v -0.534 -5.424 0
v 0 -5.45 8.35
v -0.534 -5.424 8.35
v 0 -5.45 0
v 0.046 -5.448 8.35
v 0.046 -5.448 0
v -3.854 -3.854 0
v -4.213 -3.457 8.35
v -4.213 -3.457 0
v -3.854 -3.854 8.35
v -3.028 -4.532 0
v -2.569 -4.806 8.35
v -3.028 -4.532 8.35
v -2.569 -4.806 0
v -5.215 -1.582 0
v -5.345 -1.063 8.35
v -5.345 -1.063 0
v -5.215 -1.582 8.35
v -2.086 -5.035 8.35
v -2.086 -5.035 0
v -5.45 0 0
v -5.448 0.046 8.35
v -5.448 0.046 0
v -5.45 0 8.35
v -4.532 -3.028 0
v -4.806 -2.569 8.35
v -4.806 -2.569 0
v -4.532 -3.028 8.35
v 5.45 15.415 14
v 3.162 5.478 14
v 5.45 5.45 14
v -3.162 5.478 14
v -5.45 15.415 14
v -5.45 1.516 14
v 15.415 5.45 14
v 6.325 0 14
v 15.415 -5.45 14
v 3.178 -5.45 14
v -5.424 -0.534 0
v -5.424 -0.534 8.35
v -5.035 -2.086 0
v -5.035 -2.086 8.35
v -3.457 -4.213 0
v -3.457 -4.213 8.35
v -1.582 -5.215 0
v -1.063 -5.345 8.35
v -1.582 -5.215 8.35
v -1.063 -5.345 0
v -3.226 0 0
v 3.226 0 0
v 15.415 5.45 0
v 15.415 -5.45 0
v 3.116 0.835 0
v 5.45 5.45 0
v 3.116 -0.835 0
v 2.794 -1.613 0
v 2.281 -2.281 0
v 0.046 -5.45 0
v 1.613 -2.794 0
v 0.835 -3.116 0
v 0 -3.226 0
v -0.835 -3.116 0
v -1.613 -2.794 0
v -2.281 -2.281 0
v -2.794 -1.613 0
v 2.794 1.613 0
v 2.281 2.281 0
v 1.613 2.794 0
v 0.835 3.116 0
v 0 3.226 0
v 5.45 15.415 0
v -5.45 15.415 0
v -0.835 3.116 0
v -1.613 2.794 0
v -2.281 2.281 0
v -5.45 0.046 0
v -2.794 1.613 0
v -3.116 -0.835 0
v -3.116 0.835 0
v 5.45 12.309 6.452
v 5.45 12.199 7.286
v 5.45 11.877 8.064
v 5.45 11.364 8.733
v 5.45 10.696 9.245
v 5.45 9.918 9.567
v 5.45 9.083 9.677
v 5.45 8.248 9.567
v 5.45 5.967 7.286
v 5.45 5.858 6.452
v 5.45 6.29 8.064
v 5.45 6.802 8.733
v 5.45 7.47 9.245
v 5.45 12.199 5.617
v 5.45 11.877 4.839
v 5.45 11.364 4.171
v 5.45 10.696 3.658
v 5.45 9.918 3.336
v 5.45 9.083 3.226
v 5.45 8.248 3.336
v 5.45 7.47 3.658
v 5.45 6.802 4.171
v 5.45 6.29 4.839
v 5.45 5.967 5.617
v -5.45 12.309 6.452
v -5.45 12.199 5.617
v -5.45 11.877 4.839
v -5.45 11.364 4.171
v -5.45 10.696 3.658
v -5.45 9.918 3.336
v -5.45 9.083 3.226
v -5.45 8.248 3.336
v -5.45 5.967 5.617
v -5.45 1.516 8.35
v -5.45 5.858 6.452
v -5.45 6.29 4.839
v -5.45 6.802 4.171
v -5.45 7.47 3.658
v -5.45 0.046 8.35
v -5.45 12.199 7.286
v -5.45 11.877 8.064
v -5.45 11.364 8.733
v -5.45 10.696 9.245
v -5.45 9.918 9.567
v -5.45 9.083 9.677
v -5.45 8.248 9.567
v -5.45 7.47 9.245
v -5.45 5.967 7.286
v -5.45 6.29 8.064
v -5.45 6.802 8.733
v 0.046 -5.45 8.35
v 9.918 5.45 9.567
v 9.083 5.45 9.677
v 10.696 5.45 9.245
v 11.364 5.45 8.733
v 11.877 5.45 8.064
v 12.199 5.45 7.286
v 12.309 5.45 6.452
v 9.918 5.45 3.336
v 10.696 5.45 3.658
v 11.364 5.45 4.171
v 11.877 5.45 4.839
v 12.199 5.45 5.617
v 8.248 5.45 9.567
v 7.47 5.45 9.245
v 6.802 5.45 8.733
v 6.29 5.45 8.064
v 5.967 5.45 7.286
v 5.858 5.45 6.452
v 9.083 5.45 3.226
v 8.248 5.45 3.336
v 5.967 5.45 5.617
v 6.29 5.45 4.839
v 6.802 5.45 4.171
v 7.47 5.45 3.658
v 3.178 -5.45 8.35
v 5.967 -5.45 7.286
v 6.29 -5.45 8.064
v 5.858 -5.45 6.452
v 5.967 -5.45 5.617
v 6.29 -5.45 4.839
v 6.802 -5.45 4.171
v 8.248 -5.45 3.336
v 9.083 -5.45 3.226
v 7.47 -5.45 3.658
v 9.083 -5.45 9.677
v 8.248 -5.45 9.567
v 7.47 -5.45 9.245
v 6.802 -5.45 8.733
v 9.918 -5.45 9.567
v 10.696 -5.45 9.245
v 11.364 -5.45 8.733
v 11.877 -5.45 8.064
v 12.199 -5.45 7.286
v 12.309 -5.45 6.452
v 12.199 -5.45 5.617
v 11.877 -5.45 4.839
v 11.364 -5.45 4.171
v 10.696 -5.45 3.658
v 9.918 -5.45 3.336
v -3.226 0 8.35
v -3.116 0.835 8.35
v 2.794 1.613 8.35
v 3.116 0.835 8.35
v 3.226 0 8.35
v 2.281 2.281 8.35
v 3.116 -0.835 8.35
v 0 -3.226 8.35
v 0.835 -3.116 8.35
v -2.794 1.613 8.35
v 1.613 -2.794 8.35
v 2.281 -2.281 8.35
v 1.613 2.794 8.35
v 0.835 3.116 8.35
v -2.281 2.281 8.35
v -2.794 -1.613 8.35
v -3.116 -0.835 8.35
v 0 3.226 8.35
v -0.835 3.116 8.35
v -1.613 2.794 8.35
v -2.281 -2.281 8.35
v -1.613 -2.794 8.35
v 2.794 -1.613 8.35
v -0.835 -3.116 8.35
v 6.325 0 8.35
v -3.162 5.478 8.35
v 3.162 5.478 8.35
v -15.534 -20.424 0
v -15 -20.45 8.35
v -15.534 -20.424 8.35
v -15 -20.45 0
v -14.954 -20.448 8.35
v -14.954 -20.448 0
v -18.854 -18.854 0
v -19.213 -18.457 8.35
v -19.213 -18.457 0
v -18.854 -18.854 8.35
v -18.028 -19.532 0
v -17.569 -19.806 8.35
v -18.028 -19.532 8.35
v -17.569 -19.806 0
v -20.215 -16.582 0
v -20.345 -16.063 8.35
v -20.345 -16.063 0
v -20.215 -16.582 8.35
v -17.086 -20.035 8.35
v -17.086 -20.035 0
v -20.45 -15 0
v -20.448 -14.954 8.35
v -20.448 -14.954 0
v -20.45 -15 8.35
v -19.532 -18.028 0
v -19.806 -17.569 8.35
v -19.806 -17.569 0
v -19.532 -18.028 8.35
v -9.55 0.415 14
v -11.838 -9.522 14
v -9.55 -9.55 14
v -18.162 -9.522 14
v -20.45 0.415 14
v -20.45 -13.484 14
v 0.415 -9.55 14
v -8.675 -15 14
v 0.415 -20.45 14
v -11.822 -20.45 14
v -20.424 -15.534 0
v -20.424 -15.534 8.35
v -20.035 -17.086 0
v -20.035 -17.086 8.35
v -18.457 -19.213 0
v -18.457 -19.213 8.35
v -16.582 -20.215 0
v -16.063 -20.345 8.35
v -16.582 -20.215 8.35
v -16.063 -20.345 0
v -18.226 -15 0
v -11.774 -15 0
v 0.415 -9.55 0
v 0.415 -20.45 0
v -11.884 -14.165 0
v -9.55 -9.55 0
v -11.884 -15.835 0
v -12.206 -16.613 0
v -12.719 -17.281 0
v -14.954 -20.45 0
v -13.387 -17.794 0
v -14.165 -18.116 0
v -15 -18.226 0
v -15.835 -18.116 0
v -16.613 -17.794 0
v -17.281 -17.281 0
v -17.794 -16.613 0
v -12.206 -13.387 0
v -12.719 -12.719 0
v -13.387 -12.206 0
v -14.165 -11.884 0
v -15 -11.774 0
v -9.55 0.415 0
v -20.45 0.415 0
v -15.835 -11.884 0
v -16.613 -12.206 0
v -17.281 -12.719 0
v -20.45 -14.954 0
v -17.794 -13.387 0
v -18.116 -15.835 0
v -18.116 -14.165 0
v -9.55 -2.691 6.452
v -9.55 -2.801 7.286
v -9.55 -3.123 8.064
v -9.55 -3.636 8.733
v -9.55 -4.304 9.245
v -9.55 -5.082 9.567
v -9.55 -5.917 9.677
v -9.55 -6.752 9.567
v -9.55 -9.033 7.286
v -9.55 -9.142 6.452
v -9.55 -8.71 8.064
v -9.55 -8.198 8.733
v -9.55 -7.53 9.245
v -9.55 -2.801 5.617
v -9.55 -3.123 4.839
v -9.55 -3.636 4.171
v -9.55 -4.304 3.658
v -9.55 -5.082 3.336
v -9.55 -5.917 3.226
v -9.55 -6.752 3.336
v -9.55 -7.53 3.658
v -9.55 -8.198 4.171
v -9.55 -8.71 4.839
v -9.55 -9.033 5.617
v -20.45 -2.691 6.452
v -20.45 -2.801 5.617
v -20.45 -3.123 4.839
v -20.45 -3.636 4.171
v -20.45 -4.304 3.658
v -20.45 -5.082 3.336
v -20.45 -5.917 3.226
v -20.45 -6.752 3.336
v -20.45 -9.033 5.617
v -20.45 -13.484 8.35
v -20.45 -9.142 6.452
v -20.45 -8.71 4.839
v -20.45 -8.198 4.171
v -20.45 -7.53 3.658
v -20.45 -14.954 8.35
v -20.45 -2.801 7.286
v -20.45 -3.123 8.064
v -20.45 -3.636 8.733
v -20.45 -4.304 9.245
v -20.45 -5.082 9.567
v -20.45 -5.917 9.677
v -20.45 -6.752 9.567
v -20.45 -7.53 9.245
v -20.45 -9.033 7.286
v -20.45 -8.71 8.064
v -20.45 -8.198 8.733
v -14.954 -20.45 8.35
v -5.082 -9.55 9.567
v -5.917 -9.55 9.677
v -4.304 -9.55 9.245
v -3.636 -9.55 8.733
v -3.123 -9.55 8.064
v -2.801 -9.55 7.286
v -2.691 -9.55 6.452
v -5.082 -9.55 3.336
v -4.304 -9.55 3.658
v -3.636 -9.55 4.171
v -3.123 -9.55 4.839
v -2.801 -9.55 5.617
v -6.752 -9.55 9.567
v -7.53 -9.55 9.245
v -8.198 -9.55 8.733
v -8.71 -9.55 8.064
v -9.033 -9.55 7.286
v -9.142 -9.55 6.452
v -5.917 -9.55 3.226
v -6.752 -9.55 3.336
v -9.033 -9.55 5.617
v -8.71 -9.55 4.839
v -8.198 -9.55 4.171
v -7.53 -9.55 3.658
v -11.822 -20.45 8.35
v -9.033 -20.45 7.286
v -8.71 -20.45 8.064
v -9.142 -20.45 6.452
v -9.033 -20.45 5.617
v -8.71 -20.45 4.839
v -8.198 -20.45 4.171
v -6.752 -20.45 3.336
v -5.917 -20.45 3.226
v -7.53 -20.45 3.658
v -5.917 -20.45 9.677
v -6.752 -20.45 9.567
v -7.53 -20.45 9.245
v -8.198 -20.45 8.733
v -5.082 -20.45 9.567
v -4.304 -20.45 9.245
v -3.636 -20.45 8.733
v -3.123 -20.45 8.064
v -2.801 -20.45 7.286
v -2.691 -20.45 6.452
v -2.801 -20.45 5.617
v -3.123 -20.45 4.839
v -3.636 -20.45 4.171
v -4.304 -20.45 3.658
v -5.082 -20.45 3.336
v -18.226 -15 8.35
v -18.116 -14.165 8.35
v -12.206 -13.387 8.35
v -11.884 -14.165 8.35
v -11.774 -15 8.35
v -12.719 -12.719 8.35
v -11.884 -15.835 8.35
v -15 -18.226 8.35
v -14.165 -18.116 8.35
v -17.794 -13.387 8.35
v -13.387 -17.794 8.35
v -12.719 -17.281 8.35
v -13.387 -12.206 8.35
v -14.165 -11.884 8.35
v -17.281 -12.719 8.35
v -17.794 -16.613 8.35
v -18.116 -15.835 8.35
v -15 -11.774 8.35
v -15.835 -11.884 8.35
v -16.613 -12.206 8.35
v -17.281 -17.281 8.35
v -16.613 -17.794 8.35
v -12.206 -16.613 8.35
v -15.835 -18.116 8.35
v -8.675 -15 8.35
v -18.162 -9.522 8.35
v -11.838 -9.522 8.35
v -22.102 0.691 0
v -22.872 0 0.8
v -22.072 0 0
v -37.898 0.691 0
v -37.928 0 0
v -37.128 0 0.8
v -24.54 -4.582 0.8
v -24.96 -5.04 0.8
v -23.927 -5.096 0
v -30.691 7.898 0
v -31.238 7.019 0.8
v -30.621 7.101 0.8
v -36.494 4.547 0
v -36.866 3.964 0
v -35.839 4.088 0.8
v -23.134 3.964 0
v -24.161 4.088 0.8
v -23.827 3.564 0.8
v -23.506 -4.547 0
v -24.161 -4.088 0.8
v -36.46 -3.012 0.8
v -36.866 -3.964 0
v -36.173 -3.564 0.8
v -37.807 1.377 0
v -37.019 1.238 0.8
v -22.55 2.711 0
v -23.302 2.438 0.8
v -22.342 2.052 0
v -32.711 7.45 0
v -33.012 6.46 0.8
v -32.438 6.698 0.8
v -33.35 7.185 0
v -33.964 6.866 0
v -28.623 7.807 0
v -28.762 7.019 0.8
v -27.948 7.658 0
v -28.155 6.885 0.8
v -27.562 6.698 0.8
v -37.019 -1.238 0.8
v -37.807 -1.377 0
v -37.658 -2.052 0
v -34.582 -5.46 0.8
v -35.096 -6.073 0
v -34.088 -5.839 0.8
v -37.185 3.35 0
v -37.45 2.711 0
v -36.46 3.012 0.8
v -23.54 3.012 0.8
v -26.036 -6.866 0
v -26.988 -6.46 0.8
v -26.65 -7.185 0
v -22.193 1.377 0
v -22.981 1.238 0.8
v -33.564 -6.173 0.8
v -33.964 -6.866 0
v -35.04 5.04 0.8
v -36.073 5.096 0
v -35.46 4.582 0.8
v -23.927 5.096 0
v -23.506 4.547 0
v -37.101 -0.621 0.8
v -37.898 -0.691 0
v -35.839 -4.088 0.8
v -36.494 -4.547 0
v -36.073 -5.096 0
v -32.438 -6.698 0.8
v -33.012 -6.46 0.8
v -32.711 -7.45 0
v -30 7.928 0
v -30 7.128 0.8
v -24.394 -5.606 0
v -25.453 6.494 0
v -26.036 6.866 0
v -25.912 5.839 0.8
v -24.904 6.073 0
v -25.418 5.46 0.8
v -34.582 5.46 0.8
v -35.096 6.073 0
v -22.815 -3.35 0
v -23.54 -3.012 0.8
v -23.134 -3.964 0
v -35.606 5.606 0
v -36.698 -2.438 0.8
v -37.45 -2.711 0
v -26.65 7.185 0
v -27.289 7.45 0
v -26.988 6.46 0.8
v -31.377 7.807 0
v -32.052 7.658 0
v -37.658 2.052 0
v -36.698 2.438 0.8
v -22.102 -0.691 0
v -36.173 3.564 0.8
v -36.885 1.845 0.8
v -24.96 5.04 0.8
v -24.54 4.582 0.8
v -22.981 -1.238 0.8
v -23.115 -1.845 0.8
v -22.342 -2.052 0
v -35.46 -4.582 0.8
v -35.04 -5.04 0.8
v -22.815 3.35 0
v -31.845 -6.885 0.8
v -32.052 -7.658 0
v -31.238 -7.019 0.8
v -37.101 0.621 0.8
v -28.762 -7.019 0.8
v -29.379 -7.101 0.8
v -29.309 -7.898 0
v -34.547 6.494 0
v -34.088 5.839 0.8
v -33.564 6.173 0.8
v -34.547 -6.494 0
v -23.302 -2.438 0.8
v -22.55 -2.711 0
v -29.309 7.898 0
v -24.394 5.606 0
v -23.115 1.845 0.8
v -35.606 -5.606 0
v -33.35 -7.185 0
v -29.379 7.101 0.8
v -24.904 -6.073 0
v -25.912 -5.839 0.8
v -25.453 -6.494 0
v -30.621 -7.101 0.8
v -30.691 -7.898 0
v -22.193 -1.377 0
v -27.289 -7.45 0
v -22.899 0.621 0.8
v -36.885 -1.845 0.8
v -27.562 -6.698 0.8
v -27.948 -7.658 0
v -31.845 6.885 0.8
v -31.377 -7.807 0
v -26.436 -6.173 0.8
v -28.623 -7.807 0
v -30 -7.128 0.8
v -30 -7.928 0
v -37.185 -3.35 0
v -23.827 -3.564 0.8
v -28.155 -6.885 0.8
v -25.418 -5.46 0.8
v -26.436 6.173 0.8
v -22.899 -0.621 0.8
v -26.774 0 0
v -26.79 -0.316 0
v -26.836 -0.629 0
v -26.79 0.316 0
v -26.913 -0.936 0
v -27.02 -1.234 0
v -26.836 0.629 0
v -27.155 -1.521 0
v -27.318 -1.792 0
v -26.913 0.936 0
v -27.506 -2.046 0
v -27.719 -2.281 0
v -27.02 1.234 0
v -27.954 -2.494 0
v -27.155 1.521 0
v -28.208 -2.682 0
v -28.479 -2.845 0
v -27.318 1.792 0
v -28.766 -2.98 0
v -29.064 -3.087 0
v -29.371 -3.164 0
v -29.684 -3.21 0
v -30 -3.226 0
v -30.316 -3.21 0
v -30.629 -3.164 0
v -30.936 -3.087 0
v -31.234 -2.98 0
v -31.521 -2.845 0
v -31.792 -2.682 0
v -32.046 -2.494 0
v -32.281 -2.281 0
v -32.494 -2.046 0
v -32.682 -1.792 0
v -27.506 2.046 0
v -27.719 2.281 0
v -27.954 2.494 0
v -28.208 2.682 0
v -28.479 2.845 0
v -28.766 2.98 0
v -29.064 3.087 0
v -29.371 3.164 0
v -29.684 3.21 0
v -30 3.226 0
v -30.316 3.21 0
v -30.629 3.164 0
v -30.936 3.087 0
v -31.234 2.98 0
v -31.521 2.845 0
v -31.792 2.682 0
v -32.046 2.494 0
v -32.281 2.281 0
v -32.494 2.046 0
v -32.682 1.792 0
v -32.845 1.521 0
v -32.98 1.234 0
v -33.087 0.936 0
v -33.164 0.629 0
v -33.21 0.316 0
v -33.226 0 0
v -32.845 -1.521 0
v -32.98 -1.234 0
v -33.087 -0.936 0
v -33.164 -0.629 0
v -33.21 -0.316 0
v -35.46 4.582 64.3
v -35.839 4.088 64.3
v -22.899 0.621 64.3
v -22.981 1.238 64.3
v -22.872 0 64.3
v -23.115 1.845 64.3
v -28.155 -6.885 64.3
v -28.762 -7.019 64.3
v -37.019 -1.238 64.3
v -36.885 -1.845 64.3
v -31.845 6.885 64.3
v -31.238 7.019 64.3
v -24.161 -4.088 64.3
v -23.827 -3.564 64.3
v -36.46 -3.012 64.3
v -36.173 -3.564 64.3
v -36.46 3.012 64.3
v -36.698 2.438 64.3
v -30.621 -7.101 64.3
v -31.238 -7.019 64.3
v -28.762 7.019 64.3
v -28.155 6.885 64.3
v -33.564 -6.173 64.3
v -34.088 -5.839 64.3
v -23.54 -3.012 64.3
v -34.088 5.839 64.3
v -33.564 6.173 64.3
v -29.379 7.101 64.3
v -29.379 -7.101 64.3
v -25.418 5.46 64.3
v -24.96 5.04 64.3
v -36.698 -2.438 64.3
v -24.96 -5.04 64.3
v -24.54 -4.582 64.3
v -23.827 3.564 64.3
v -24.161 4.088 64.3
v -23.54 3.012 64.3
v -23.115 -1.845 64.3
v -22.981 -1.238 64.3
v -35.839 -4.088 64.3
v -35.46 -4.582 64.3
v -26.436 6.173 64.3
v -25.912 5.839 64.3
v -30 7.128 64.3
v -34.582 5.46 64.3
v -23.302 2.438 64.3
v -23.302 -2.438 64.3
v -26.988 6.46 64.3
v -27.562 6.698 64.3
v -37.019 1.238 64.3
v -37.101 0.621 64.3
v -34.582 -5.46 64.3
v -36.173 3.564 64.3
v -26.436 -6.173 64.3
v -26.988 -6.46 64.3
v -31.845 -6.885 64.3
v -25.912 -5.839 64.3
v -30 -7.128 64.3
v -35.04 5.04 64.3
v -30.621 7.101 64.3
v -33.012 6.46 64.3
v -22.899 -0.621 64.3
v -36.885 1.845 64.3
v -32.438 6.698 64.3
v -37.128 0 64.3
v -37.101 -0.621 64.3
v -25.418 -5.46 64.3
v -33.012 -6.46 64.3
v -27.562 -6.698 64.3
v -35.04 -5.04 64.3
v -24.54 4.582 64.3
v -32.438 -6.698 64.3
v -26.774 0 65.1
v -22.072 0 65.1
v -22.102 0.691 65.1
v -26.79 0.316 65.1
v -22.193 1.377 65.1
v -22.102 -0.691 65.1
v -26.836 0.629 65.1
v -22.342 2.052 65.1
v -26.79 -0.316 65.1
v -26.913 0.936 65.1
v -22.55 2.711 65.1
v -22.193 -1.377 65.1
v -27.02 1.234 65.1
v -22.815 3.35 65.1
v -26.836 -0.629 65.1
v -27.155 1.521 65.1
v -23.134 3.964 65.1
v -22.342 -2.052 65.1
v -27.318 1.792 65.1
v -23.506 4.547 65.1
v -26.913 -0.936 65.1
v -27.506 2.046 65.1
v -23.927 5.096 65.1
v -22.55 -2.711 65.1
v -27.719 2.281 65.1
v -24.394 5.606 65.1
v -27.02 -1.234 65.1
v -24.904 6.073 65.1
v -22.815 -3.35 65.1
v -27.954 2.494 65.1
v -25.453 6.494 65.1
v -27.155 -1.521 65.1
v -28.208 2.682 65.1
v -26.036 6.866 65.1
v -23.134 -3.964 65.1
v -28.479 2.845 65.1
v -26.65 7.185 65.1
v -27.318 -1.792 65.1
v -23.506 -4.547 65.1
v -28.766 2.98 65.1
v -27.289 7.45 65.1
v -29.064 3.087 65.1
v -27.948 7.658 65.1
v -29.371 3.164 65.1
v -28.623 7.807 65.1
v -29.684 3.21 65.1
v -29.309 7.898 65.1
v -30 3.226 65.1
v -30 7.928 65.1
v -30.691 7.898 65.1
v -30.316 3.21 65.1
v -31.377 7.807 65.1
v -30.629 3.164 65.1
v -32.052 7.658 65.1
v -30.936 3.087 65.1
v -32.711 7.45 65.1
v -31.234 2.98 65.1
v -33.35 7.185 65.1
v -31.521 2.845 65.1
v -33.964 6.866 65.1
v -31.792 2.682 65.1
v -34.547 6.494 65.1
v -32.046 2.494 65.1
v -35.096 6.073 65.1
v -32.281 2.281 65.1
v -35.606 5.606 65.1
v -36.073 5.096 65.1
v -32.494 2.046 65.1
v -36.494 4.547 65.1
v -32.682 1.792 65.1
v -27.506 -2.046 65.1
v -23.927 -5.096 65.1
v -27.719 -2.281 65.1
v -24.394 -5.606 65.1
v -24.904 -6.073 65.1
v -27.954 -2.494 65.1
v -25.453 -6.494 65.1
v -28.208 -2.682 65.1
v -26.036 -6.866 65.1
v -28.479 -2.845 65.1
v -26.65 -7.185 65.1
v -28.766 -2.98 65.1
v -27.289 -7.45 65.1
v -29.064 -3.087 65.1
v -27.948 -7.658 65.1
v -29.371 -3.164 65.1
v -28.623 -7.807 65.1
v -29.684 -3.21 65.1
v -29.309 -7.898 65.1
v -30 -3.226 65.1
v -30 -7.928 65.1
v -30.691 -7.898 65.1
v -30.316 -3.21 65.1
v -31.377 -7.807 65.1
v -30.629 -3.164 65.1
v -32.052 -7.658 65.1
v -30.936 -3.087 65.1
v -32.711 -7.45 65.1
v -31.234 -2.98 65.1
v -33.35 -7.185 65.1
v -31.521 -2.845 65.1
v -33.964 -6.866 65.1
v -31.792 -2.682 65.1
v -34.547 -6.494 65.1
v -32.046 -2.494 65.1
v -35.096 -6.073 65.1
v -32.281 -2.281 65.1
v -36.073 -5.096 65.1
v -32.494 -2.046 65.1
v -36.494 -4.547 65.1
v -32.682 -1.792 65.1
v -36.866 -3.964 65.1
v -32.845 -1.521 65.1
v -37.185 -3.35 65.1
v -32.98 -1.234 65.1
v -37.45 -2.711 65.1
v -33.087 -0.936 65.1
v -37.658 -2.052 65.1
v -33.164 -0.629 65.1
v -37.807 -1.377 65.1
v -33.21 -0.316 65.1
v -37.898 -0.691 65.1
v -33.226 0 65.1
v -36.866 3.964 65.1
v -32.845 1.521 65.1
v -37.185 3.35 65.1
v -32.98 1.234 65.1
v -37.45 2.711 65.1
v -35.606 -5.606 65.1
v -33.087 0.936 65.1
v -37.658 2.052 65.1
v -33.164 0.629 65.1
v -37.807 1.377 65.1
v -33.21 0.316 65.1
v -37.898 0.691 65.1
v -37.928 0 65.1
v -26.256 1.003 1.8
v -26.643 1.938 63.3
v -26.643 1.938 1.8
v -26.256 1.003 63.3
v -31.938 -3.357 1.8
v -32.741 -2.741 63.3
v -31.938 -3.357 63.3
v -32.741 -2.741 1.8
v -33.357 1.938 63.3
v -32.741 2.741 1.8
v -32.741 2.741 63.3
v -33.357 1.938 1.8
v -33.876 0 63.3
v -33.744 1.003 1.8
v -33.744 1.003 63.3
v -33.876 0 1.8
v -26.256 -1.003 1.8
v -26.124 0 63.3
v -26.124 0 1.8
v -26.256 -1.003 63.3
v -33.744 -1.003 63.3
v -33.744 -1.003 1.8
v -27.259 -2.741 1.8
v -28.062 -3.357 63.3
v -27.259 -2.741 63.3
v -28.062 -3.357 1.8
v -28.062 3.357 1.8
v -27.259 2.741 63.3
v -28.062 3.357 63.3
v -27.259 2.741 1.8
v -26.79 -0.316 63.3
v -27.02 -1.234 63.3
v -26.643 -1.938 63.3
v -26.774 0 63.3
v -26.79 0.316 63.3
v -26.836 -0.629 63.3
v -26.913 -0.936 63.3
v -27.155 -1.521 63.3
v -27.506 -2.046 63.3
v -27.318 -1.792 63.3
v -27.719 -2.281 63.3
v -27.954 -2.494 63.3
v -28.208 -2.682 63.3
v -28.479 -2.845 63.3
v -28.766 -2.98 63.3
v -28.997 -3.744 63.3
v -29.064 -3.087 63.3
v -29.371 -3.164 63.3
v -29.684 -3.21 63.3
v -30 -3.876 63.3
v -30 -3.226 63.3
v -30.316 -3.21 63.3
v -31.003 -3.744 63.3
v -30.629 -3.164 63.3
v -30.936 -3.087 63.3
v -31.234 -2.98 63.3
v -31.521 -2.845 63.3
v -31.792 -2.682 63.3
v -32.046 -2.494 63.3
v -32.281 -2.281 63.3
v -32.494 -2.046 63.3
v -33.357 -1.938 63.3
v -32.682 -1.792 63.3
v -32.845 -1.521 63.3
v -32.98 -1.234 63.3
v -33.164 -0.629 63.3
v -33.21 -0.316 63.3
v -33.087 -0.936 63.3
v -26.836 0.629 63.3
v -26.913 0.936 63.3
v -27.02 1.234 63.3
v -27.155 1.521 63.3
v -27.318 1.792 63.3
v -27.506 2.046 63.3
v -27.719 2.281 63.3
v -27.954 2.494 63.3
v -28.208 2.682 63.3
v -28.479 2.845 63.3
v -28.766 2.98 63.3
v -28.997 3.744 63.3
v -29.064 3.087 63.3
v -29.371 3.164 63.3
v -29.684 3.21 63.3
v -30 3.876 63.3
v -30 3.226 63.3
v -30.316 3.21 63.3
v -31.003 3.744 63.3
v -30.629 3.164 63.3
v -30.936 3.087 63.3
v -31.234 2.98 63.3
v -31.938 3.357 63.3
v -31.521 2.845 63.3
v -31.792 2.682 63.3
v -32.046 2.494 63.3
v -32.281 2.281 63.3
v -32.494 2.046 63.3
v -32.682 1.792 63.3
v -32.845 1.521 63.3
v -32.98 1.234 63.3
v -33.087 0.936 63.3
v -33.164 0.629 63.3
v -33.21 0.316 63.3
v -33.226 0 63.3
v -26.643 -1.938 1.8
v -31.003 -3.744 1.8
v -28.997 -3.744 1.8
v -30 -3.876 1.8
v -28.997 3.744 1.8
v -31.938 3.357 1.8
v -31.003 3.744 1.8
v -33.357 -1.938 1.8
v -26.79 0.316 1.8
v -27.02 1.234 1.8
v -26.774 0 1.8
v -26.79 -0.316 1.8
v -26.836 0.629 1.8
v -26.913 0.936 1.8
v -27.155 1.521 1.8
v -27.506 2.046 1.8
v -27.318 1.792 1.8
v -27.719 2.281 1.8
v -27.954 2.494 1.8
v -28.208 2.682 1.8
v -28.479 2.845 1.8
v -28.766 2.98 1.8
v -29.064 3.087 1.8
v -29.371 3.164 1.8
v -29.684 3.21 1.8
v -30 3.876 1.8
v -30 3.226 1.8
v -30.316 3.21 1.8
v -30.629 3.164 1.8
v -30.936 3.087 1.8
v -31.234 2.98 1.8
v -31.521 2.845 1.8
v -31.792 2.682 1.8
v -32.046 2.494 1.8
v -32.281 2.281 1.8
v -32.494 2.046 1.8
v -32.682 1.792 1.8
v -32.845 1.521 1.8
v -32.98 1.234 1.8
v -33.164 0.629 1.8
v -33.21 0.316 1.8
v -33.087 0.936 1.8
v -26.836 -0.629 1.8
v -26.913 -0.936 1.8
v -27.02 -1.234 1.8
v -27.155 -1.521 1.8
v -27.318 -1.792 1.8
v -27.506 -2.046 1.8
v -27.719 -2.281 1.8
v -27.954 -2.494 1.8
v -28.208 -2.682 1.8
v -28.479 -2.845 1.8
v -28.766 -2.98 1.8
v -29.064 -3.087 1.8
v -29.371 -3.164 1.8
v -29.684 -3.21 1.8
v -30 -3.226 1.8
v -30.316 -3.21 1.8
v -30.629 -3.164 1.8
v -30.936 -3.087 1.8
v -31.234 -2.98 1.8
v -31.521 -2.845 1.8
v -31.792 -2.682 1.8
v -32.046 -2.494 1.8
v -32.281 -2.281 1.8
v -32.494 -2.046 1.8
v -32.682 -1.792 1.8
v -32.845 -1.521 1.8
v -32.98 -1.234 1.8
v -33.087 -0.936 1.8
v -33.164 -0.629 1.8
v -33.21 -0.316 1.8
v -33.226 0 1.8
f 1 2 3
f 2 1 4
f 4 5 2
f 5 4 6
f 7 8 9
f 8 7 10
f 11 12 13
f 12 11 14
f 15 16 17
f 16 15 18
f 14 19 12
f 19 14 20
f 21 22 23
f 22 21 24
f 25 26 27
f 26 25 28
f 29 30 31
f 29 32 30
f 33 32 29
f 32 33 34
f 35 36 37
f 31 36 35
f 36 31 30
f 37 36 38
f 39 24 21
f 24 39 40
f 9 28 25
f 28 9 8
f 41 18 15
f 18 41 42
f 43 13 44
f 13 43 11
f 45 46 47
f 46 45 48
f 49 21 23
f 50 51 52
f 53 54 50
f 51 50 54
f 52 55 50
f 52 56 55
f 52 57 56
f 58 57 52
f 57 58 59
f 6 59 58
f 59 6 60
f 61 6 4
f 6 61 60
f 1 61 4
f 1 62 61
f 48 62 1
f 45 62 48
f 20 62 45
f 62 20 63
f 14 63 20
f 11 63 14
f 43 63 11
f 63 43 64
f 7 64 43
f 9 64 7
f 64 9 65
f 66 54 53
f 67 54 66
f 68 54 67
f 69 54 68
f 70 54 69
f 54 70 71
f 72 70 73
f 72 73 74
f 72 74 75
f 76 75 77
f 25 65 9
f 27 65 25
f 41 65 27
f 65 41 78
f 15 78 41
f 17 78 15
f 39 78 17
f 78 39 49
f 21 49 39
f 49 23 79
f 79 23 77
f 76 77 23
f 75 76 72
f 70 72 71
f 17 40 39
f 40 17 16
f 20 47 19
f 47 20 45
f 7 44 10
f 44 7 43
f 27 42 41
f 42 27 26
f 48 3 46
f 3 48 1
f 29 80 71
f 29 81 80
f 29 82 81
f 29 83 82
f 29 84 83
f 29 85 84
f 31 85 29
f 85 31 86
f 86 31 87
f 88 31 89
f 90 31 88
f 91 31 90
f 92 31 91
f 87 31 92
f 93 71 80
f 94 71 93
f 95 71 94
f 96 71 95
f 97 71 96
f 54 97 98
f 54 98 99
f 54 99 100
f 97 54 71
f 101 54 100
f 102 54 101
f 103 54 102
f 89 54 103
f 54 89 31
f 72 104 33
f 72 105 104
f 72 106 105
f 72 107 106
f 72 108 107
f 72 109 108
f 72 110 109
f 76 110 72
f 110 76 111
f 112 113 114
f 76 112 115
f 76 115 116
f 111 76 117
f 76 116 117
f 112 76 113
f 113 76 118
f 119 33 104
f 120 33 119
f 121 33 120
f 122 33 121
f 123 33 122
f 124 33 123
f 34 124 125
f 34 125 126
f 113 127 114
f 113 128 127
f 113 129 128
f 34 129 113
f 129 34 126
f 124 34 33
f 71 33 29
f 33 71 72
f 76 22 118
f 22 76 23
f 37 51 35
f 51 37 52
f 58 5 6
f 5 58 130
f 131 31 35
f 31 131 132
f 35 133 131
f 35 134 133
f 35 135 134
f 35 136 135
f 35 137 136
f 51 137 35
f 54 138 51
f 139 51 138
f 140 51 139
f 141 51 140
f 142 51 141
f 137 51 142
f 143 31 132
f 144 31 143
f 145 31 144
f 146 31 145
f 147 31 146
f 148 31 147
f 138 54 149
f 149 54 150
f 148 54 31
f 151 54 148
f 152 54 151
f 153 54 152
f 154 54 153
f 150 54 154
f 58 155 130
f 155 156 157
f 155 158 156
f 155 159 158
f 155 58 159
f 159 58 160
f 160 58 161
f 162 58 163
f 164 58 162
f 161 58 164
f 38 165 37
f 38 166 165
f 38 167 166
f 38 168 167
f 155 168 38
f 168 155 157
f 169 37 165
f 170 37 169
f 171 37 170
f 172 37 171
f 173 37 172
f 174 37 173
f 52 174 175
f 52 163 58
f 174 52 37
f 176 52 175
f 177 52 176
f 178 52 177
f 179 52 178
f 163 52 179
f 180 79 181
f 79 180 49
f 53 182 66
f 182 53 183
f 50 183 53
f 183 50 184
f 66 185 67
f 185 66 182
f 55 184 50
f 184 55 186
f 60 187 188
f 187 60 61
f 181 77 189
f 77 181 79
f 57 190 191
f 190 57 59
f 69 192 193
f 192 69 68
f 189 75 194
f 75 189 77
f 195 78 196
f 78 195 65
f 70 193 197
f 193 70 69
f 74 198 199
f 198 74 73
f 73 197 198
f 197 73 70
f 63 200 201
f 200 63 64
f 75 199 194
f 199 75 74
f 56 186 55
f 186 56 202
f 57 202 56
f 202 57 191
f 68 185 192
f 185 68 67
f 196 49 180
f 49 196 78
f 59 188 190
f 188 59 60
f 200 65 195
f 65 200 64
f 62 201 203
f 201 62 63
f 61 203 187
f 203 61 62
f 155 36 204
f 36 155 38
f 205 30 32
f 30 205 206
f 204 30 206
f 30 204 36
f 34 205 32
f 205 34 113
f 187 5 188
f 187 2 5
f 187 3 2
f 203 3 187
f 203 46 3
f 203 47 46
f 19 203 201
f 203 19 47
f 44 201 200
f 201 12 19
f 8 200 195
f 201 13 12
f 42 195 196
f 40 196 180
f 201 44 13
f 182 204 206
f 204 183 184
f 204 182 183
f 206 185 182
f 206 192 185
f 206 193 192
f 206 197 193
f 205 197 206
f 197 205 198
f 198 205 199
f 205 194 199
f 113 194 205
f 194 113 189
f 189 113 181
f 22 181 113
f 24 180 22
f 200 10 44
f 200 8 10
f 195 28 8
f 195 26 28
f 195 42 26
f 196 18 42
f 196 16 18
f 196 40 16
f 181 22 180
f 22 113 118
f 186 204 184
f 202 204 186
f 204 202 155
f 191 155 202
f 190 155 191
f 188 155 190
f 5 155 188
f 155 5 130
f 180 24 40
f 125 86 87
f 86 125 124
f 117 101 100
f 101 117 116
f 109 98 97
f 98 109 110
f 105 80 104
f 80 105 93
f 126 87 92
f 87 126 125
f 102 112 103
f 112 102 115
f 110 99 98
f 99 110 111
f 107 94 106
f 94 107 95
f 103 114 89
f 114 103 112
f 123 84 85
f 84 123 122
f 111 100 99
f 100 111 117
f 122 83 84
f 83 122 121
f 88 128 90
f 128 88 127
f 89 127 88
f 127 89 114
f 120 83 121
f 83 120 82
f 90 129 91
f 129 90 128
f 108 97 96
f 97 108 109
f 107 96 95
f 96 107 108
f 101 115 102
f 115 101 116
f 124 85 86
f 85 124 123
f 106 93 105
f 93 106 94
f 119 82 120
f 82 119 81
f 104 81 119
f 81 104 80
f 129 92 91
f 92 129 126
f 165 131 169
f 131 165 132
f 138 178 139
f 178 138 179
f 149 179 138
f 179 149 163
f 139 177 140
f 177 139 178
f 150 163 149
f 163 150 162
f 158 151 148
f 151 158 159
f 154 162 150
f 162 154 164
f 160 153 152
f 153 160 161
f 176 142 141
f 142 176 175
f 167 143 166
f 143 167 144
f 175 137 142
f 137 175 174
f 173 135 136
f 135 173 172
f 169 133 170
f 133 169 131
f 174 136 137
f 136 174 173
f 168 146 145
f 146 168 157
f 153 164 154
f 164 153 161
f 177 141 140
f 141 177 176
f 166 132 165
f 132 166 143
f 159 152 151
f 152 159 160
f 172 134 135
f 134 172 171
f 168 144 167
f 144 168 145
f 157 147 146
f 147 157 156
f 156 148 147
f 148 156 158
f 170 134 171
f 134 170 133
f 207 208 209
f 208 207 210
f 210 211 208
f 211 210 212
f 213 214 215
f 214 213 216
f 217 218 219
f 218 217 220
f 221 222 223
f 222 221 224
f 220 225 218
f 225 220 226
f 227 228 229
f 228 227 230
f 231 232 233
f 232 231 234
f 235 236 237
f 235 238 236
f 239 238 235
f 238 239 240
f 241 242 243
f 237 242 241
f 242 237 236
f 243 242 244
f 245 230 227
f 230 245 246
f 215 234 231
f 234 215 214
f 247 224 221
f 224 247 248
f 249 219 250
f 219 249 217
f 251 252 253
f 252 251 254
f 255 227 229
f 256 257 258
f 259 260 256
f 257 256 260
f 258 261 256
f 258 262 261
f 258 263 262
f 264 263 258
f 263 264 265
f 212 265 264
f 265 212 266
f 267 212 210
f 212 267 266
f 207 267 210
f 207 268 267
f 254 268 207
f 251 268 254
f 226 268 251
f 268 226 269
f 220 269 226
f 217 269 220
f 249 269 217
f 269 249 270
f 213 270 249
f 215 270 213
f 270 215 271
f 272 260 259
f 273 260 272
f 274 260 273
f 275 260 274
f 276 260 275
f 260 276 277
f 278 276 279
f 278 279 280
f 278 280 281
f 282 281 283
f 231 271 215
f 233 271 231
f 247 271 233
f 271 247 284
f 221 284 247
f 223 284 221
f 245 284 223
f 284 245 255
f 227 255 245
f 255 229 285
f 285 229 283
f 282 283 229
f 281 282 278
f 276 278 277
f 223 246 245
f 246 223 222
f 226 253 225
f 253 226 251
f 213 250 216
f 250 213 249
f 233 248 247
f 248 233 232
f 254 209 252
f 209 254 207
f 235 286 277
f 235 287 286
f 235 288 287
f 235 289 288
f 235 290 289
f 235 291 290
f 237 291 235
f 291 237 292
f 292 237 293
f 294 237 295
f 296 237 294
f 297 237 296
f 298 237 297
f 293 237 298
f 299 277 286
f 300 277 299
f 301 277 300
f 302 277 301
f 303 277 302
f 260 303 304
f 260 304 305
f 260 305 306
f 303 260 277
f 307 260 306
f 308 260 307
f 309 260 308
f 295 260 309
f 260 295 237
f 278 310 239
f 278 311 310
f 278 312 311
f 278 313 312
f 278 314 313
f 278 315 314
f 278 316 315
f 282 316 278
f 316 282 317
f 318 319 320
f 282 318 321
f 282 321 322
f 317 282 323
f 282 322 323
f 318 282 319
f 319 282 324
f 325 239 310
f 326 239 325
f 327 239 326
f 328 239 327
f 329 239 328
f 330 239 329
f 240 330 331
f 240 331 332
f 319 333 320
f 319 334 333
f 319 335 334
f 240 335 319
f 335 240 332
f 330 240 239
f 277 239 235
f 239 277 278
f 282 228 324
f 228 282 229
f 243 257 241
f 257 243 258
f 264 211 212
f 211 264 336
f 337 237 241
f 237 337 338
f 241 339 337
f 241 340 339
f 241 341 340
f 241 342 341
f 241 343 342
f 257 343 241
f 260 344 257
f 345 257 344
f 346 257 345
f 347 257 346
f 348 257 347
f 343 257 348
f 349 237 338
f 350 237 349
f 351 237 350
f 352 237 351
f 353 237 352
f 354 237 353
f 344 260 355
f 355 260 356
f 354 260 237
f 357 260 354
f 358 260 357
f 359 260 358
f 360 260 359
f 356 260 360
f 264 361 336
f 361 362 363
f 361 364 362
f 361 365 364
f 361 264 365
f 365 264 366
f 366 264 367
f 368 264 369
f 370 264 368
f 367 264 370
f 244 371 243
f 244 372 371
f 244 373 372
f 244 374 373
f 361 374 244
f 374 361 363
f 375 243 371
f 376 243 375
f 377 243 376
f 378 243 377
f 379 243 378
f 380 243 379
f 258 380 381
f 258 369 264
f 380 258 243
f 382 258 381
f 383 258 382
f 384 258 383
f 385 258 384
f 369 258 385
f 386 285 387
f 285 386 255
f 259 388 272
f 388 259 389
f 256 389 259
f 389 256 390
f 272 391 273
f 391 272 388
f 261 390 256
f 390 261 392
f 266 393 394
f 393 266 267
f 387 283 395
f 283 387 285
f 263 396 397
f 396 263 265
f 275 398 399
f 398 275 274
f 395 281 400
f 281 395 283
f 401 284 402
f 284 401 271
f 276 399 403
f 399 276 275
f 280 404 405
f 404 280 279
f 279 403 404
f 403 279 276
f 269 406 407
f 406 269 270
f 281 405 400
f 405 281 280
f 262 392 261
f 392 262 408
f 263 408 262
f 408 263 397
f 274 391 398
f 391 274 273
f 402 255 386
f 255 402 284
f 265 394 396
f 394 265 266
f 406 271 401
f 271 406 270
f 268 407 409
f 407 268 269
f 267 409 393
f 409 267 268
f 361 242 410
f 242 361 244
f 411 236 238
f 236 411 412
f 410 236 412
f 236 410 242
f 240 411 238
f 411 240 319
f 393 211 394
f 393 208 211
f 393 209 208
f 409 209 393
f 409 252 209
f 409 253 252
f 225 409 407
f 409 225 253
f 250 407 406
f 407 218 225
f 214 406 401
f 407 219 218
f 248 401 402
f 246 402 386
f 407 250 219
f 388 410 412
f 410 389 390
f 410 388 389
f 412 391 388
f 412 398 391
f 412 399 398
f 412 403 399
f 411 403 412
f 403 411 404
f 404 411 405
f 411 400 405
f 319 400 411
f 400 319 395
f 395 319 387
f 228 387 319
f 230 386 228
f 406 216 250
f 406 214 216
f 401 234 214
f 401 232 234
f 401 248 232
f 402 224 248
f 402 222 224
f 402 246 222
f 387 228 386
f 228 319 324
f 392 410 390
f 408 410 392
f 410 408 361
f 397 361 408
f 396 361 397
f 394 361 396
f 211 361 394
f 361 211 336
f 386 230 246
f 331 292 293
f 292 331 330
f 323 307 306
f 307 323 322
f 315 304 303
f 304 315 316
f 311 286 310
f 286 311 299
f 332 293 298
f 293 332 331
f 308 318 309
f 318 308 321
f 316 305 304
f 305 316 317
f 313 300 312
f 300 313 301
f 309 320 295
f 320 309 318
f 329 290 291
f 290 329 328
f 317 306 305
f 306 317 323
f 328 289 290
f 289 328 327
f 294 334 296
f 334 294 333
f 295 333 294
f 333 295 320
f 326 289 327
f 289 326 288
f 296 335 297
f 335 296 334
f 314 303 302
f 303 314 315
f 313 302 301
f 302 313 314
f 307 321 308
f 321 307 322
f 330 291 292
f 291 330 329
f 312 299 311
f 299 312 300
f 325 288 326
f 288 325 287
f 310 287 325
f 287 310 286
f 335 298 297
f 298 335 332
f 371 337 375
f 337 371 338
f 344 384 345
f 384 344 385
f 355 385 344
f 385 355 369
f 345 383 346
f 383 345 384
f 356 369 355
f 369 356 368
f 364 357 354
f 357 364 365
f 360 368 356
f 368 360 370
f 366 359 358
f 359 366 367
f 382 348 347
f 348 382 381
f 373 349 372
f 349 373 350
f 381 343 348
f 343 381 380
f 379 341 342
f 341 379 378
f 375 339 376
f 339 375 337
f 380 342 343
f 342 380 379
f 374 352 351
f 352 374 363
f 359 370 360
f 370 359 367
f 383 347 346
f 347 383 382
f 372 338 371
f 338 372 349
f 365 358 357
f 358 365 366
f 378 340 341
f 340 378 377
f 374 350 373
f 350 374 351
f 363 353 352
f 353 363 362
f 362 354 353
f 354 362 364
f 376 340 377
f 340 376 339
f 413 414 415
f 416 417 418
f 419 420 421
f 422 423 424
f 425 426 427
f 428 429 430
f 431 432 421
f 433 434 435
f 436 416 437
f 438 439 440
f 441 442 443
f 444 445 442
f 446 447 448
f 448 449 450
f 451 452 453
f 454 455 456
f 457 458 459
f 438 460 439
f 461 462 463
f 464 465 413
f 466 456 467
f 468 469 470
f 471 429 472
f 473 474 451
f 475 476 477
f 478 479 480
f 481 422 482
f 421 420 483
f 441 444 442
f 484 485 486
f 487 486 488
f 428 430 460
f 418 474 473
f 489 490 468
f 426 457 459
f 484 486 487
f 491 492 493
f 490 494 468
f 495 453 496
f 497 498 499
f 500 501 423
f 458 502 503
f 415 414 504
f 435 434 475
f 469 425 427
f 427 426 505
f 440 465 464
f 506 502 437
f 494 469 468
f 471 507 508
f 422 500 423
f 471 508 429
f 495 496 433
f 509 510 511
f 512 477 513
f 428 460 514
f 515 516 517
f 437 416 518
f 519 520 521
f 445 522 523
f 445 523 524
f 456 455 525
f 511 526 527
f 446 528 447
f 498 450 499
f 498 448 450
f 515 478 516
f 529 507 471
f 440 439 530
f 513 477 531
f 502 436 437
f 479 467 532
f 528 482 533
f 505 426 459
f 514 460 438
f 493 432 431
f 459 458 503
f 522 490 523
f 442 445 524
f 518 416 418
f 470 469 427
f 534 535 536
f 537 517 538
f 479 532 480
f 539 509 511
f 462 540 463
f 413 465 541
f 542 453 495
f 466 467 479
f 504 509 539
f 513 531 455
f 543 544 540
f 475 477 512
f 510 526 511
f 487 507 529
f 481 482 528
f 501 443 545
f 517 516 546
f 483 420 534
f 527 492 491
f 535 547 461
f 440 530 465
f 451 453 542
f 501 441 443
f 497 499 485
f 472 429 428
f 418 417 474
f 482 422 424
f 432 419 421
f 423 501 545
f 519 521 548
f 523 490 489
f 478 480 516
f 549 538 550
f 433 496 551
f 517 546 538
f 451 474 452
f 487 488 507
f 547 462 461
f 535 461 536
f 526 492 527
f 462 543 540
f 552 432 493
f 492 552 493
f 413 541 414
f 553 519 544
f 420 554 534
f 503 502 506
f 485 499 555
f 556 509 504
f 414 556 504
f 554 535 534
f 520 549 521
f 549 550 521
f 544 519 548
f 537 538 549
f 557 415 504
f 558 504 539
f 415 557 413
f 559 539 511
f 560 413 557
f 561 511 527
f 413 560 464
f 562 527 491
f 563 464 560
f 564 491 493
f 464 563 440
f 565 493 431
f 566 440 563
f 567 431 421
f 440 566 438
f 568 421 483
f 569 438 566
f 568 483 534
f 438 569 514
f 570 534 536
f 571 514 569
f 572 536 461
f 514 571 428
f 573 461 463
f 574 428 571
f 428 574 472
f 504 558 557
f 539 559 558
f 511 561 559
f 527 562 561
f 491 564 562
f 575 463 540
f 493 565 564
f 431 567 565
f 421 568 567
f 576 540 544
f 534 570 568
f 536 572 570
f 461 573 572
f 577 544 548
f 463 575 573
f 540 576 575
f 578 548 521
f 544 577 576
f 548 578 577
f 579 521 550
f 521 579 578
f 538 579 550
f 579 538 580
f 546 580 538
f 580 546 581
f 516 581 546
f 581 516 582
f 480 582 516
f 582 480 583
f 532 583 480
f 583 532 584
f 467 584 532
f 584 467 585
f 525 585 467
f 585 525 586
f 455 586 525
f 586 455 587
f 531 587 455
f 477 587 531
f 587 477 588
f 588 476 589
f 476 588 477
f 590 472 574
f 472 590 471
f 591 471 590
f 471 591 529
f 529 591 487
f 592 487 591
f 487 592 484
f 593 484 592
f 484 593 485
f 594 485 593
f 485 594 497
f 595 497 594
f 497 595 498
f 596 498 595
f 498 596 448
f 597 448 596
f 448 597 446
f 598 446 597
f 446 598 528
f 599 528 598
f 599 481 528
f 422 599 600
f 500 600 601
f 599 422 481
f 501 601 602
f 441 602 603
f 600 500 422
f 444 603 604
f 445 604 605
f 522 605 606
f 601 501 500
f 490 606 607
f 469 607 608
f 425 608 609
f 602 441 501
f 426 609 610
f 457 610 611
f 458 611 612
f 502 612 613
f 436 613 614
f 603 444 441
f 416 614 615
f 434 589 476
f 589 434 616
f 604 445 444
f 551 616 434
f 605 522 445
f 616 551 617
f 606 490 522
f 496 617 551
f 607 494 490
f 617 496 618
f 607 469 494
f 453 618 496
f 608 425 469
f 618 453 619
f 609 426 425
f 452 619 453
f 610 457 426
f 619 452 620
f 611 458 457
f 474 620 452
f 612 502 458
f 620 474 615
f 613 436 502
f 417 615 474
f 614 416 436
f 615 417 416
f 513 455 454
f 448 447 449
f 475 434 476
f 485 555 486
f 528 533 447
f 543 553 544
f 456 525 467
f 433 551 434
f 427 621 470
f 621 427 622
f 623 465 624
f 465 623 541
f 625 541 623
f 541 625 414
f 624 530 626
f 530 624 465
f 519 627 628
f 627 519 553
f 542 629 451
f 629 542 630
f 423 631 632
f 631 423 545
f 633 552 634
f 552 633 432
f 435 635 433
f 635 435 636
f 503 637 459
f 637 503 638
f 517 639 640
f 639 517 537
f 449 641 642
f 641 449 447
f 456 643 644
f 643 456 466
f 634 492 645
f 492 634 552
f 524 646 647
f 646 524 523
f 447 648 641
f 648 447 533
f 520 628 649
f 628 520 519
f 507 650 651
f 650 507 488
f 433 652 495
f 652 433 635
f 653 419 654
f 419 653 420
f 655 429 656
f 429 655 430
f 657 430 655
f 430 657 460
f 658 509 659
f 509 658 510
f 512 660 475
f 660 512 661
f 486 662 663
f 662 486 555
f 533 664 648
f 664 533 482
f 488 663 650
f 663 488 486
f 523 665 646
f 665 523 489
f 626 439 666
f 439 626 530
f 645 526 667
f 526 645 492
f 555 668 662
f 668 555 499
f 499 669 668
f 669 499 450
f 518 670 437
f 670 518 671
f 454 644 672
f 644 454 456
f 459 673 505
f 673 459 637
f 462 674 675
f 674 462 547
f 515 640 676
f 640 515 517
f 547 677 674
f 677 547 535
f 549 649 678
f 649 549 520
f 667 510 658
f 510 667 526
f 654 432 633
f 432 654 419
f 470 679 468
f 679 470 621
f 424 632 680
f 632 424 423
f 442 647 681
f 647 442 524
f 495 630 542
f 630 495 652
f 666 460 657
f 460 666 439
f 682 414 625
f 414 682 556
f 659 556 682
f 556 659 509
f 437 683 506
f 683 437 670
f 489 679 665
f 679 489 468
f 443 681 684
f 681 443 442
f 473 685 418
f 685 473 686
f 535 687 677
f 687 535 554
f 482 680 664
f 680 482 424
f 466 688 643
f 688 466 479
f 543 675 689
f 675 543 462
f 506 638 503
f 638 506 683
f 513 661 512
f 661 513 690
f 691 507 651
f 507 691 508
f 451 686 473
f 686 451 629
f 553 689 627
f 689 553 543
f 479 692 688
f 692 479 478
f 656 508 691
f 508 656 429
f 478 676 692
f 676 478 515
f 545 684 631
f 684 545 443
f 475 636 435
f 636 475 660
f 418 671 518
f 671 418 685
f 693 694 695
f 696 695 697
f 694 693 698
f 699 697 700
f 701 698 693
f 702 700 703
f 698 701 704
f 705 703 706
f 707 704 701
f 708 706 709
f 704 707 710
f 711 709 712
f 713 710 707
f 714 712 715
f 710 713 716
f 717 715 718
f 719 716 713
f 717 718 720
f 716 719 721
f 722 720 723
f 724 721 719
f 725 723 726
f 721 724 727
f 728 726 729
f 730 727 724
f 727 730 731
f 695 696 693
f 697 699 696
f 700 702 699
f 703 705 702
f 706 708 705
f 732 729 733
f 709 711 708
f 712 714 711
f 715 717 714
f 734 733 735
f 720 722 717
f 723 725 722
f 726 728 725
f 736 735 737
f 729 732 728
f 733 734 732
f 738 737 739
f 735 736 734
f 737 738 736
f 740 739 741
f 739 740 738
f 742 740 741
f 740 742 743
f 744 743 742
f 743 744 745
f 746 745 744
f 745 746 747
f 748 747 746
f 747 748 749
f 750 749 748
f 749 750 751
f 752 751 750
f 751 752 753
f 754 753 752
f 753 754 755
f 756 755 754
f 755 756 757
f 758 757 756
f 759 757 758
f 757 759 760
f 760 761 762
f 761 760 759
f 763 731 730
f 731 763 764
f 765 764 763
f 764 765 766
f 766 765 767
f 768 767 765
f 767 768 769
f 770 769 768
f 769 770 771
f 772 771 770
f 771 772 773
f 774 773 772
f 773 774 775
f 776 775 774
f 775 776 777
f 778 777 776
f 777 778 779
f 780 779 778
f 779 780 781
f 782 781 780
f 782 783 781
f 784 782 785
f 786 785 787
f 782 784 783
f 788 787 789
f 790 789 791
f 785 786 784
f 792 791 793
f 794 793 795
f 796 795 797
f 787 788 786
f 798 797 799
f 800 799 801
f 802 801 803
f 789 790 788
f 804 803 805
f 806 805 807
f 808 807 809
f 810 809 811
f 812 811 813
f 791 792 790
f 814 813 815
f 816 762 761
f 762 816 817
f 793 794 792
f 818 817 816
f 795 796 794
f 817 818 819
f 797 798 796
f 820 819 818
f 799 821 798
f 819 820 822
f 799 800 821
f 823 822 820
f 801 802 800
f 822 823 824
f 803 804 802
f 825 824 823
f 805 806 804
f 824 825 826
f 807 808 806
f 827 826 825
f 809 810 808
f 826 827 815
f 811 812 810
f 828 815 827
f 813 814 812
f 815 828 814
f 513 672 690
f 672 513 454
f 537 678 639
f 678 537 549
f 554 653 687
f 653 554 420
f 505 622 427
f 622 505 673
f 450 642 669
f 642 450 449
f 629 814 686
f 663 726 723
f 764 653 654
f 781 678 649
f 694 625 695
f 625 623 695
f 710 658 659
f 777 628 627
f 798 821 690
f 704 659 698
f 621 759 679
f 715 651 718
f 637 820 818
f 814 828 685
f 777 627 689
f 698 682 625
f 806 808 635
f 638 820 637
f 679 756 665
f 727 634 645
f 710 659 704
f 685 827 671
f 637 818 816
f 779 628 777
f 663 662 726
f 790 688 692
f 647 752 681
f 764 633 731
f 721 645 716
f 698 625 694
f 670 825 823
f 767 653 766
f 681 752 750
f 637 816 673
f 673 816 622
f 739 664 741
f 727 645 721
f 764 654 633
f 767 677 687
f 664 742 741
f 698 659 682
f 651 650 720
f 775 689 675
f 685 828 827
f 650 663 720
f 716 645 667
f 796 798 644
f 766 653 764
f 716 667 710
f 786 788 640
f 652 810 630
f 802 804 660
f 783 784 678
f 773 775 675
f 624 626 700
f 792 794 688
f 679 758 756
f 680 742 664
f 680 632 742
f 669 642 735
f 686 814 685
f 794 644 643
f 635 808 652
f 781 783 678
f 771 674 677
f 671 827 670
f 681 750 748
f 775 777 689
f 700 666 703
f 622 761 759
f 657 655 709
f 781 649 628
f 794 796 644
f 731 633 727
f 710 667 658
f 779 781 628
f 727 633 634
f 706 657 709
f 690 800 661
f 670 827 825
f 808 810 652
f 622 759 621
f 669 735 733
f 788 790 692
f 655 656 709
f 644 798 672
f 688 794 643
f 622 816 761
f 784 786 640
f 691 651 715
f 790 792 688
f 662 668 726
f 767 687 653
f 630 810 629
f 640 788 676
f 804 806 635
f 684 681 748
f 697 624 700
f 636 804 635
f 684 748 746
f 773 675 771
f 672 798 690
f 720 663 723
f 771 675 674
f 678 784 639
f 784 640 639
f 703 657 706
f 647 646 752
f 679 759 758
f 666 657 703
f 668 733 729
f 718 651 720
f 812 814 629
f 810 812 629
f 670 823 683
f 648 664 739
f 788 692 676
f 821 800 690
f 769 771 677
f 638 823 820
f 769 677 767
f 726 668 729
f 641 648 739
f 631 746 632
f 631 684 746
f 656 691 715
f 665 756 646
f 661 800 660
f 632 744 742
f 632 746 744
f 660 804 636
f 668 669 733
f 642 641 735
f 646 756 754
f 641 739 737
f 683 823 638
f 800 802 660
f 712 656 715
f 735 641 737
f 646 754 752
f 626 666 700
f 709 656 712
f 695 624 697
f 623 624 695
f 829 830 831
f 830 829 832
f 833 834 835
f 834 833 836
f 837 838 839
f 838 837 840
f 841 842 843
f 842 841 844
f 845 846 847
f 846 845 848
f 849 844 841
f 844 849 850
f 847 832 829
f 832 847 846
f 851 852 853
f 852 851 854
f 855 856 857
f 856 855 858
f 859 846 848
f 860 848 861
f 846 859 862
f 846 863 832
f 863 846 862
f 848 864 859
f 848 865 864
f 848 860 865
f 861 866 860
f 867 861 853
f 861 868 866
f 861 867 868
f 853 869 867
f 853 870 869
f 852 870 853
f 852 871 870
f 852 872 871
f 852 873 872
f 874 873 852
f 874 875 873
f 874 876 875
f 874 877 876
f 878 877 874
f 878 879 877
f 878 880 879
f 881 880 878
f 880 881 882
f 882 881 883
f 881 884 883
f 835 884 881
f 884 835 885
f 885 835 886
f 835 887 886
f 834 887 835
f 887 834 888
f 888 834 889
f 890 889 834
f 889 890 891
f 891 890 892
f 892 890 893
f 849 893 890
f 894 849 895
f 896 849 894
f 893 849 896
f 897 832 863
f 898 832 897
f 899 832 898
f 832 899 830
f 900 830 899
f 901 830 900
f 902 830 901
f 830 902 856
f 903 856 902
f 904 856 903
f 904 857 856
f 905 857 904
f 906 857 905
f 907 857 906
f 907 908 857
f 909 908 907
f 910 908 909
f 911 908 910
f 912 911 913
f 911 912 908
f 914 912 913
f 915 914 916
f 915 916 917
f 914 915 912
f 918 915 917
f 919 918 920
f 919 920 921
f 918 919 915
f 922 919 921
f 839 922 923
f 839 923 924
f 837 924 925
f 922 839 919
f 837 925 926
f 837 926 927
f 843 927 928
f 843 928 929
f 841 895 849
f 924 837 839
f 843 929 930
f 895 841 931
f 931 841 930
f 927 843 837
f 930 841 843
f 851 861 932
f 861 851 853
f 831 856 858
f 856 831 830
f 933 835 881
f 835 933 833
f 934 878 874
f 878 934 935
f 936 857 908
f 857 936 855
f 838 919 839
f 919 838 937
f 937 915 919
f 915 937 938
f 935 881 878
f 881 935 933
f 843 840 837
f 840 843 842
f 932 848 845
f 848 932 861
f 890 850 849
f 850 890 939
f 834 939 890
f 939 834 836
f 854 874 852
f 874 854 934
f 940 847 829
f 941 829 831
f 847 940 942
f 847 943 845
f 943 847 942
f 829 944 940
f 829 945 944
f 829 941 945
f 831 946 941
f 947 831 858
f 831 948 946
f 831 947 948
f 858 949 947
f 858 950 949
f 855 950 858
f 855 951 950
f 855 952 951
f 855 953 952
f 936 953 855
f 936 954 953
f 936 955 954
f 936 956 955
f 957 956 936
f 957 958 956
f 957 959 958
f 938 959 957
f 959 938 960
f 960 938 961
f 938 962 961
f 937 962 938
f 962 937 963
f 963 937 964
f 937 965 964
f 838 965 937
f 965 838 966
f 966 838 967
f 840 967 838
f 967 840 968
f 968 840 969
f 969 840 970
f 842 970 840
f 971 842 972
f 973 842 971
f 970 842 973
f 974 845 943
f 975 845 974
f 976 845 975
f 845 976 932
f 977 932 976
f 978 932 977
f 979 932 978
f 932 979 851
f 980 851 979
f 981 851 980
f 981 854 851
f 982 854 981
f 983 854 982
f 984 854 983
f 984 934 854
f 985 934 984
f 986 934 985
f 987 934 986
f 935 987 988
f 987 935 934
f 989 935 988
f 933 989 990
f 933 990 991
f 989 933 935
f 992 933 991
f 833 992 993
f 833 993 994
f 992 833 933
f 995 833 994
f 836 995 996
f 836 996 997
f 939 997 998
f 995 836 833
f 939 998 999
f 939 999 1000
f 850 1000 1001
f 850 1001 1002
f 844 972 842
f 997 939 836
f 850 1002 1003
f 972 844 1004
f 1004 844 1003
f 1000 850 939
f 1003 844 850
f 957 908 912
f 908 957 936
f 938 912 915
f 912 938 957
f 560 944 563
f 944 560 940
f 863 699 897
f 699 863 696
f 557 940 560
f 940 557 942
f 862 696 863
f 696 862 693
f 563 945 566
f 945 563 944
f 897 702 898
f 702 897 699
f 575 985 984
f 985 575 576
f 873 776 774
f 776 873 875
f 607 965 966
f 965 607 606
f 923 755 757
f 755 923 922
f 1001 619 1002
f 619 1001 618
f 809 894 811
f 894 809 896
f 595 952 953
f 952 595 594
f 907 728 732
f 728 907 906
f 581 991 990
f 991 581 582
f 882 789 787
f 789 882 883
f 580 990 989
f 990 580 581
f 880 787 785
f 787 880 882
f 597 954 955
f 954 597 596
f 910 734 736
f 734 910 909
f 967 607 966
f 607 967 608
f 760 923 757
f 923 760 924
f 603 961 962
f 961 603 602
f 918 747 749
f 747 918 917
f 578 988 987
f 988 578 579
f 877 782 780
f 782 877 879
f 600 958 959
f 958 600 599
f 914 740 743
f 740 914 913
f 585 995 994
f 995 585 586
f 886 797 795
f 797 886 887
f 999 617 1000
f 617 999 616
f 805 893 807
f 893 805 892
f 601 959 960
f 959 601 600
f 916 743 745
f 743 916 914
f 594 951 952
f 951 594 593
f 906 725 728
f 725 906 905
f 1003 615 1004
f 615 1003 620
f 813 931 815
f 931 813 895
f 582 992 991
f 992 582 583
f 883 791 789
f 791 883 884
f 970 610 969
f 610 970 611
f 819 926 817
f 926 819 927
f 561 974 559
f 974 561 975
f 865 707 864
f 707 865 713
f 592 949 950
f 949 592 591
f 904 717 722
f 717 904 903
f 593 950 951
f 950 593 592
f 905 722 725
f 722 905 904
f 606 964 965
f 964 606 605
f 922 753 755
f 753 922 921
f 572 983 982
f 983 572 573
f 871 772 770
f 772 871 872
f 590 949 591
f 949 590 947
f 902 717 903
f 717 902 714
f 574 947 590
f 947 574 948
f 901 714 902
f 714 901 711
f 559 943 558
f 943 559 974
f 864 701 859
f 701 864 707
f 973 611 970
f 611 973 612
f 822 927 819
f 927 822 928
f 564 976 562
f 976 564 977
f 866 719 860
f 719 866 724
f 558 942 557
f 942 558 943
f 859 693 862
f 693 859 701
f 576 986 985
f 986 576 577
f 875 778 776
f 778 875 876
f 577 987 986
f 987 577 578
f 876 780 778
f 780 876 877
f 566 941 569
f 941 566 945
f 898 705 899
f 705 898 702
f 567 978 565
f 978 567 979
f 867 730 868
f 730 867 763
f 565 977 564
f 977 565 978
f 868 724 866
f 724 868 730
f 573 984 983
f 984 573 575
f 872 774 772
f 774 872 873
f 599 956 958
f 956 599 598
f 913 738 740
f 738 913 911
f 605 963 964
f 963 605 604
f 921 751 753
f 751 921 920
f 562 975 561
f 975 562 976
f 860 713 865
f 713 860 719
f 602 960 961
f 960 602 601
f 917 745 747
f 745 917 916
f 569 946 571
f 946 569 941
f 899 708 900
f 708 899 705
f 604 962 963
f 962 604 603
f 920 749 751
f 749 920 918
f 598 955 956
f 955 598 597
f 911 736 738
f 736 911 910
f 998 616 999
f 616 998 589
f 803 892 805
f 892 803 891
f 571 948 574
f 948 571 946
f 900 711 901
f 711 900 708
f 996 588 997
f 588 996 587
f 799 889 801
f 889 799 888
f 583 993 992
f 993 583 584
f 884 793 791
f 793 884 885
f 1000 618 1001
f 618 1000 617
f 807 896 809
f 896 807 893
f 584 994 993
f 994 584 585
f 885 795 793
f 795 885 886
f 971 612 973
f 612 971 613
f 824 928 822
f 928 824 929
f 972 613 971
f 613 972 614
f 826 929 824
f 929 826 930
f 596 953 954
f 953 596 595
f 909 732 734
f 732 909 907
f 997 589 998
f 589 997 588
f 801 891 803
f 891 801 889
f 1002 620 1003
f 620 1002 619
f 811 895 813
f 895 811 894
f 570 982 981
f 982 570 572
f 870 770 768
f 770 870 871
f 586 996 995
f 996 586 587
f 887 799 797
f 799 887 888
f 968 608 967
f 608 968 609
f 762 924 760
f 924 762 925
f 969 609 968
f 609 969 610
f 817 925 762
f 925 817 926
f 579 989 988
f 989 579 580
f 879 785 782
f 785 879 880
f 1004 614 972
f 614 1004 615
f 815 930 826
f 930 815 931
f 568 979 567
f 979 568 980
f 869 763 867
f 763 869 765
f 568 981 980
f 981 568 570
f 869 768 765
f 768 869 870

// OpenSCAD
// corner parts & rollers to guide cards & belts

cornershape();
translate([-15, -15, 0])
    cornershape();
translate([-30,0,0])
    roller();
    
partht = 14;
curve = 10.9;
rodr = 0.254*25.4/2;


module cornershape(diam=curve, ht=partht, rod=rodr){
    difference(){
        union(){
            cylinder(r=diam/2, h=ht, $fn=64, center=false);
            translate([0,diam/1.41, ht/2])
                cube([diam,diam*1.41,ht], center=true);
            translate([diam/1.41, 0, ht/2])
                cube([diam*1.41, diam, ht], center=true);
        }
    translate([0,0,-.05])
        #boltnut();
        translate([diam/1.2, diam/1.2, rod*2]) rotate([180,180,0])
            #axles();
    }
}

module boltnut(rod=rodr, ht=partht, nutrad=12.65/2, washrad=14/2, washthk=2, nutht=5.6){
    cylinder(r=rod, h=ht+0.1, $fn=24, center=false);
    translate([0,0,ht-nutht])
        cylinder(r=nutrad, h=partht, $fn=6, center=false);
}

module axles(rad=rodr, length=curve*3){
    for (i=[0,90]){
        rotate([0,90,i])
            cylinder(r=rad, h=length+.5, $fn=24, center=false);
    }
}

module roller(ht=63.5+1.6,  rad=rodr*1.5+curve*1.41 - curve*1.2, spinhole=rodr){
    difference(){
        union(){
            cylinder(r1=rad+0.8, r2=rad, h=.8, $fn=72);
            cylinder(r=rad, h=ht, $fn=72);
            translate([0,0,ht-.8])
                cylinder(r1=rad, r2=rad+0.8, h=.8, $fn=72);
        }
    translate([0,0,ht/2])
        cylinder(r=spinhole+.65, h=ht-3.6, $fn=24, center=true);
    translate([0,0,-.05])
        cylinder(r=spinhole, h=ht+0.1, $fn=64);    
    }
}
